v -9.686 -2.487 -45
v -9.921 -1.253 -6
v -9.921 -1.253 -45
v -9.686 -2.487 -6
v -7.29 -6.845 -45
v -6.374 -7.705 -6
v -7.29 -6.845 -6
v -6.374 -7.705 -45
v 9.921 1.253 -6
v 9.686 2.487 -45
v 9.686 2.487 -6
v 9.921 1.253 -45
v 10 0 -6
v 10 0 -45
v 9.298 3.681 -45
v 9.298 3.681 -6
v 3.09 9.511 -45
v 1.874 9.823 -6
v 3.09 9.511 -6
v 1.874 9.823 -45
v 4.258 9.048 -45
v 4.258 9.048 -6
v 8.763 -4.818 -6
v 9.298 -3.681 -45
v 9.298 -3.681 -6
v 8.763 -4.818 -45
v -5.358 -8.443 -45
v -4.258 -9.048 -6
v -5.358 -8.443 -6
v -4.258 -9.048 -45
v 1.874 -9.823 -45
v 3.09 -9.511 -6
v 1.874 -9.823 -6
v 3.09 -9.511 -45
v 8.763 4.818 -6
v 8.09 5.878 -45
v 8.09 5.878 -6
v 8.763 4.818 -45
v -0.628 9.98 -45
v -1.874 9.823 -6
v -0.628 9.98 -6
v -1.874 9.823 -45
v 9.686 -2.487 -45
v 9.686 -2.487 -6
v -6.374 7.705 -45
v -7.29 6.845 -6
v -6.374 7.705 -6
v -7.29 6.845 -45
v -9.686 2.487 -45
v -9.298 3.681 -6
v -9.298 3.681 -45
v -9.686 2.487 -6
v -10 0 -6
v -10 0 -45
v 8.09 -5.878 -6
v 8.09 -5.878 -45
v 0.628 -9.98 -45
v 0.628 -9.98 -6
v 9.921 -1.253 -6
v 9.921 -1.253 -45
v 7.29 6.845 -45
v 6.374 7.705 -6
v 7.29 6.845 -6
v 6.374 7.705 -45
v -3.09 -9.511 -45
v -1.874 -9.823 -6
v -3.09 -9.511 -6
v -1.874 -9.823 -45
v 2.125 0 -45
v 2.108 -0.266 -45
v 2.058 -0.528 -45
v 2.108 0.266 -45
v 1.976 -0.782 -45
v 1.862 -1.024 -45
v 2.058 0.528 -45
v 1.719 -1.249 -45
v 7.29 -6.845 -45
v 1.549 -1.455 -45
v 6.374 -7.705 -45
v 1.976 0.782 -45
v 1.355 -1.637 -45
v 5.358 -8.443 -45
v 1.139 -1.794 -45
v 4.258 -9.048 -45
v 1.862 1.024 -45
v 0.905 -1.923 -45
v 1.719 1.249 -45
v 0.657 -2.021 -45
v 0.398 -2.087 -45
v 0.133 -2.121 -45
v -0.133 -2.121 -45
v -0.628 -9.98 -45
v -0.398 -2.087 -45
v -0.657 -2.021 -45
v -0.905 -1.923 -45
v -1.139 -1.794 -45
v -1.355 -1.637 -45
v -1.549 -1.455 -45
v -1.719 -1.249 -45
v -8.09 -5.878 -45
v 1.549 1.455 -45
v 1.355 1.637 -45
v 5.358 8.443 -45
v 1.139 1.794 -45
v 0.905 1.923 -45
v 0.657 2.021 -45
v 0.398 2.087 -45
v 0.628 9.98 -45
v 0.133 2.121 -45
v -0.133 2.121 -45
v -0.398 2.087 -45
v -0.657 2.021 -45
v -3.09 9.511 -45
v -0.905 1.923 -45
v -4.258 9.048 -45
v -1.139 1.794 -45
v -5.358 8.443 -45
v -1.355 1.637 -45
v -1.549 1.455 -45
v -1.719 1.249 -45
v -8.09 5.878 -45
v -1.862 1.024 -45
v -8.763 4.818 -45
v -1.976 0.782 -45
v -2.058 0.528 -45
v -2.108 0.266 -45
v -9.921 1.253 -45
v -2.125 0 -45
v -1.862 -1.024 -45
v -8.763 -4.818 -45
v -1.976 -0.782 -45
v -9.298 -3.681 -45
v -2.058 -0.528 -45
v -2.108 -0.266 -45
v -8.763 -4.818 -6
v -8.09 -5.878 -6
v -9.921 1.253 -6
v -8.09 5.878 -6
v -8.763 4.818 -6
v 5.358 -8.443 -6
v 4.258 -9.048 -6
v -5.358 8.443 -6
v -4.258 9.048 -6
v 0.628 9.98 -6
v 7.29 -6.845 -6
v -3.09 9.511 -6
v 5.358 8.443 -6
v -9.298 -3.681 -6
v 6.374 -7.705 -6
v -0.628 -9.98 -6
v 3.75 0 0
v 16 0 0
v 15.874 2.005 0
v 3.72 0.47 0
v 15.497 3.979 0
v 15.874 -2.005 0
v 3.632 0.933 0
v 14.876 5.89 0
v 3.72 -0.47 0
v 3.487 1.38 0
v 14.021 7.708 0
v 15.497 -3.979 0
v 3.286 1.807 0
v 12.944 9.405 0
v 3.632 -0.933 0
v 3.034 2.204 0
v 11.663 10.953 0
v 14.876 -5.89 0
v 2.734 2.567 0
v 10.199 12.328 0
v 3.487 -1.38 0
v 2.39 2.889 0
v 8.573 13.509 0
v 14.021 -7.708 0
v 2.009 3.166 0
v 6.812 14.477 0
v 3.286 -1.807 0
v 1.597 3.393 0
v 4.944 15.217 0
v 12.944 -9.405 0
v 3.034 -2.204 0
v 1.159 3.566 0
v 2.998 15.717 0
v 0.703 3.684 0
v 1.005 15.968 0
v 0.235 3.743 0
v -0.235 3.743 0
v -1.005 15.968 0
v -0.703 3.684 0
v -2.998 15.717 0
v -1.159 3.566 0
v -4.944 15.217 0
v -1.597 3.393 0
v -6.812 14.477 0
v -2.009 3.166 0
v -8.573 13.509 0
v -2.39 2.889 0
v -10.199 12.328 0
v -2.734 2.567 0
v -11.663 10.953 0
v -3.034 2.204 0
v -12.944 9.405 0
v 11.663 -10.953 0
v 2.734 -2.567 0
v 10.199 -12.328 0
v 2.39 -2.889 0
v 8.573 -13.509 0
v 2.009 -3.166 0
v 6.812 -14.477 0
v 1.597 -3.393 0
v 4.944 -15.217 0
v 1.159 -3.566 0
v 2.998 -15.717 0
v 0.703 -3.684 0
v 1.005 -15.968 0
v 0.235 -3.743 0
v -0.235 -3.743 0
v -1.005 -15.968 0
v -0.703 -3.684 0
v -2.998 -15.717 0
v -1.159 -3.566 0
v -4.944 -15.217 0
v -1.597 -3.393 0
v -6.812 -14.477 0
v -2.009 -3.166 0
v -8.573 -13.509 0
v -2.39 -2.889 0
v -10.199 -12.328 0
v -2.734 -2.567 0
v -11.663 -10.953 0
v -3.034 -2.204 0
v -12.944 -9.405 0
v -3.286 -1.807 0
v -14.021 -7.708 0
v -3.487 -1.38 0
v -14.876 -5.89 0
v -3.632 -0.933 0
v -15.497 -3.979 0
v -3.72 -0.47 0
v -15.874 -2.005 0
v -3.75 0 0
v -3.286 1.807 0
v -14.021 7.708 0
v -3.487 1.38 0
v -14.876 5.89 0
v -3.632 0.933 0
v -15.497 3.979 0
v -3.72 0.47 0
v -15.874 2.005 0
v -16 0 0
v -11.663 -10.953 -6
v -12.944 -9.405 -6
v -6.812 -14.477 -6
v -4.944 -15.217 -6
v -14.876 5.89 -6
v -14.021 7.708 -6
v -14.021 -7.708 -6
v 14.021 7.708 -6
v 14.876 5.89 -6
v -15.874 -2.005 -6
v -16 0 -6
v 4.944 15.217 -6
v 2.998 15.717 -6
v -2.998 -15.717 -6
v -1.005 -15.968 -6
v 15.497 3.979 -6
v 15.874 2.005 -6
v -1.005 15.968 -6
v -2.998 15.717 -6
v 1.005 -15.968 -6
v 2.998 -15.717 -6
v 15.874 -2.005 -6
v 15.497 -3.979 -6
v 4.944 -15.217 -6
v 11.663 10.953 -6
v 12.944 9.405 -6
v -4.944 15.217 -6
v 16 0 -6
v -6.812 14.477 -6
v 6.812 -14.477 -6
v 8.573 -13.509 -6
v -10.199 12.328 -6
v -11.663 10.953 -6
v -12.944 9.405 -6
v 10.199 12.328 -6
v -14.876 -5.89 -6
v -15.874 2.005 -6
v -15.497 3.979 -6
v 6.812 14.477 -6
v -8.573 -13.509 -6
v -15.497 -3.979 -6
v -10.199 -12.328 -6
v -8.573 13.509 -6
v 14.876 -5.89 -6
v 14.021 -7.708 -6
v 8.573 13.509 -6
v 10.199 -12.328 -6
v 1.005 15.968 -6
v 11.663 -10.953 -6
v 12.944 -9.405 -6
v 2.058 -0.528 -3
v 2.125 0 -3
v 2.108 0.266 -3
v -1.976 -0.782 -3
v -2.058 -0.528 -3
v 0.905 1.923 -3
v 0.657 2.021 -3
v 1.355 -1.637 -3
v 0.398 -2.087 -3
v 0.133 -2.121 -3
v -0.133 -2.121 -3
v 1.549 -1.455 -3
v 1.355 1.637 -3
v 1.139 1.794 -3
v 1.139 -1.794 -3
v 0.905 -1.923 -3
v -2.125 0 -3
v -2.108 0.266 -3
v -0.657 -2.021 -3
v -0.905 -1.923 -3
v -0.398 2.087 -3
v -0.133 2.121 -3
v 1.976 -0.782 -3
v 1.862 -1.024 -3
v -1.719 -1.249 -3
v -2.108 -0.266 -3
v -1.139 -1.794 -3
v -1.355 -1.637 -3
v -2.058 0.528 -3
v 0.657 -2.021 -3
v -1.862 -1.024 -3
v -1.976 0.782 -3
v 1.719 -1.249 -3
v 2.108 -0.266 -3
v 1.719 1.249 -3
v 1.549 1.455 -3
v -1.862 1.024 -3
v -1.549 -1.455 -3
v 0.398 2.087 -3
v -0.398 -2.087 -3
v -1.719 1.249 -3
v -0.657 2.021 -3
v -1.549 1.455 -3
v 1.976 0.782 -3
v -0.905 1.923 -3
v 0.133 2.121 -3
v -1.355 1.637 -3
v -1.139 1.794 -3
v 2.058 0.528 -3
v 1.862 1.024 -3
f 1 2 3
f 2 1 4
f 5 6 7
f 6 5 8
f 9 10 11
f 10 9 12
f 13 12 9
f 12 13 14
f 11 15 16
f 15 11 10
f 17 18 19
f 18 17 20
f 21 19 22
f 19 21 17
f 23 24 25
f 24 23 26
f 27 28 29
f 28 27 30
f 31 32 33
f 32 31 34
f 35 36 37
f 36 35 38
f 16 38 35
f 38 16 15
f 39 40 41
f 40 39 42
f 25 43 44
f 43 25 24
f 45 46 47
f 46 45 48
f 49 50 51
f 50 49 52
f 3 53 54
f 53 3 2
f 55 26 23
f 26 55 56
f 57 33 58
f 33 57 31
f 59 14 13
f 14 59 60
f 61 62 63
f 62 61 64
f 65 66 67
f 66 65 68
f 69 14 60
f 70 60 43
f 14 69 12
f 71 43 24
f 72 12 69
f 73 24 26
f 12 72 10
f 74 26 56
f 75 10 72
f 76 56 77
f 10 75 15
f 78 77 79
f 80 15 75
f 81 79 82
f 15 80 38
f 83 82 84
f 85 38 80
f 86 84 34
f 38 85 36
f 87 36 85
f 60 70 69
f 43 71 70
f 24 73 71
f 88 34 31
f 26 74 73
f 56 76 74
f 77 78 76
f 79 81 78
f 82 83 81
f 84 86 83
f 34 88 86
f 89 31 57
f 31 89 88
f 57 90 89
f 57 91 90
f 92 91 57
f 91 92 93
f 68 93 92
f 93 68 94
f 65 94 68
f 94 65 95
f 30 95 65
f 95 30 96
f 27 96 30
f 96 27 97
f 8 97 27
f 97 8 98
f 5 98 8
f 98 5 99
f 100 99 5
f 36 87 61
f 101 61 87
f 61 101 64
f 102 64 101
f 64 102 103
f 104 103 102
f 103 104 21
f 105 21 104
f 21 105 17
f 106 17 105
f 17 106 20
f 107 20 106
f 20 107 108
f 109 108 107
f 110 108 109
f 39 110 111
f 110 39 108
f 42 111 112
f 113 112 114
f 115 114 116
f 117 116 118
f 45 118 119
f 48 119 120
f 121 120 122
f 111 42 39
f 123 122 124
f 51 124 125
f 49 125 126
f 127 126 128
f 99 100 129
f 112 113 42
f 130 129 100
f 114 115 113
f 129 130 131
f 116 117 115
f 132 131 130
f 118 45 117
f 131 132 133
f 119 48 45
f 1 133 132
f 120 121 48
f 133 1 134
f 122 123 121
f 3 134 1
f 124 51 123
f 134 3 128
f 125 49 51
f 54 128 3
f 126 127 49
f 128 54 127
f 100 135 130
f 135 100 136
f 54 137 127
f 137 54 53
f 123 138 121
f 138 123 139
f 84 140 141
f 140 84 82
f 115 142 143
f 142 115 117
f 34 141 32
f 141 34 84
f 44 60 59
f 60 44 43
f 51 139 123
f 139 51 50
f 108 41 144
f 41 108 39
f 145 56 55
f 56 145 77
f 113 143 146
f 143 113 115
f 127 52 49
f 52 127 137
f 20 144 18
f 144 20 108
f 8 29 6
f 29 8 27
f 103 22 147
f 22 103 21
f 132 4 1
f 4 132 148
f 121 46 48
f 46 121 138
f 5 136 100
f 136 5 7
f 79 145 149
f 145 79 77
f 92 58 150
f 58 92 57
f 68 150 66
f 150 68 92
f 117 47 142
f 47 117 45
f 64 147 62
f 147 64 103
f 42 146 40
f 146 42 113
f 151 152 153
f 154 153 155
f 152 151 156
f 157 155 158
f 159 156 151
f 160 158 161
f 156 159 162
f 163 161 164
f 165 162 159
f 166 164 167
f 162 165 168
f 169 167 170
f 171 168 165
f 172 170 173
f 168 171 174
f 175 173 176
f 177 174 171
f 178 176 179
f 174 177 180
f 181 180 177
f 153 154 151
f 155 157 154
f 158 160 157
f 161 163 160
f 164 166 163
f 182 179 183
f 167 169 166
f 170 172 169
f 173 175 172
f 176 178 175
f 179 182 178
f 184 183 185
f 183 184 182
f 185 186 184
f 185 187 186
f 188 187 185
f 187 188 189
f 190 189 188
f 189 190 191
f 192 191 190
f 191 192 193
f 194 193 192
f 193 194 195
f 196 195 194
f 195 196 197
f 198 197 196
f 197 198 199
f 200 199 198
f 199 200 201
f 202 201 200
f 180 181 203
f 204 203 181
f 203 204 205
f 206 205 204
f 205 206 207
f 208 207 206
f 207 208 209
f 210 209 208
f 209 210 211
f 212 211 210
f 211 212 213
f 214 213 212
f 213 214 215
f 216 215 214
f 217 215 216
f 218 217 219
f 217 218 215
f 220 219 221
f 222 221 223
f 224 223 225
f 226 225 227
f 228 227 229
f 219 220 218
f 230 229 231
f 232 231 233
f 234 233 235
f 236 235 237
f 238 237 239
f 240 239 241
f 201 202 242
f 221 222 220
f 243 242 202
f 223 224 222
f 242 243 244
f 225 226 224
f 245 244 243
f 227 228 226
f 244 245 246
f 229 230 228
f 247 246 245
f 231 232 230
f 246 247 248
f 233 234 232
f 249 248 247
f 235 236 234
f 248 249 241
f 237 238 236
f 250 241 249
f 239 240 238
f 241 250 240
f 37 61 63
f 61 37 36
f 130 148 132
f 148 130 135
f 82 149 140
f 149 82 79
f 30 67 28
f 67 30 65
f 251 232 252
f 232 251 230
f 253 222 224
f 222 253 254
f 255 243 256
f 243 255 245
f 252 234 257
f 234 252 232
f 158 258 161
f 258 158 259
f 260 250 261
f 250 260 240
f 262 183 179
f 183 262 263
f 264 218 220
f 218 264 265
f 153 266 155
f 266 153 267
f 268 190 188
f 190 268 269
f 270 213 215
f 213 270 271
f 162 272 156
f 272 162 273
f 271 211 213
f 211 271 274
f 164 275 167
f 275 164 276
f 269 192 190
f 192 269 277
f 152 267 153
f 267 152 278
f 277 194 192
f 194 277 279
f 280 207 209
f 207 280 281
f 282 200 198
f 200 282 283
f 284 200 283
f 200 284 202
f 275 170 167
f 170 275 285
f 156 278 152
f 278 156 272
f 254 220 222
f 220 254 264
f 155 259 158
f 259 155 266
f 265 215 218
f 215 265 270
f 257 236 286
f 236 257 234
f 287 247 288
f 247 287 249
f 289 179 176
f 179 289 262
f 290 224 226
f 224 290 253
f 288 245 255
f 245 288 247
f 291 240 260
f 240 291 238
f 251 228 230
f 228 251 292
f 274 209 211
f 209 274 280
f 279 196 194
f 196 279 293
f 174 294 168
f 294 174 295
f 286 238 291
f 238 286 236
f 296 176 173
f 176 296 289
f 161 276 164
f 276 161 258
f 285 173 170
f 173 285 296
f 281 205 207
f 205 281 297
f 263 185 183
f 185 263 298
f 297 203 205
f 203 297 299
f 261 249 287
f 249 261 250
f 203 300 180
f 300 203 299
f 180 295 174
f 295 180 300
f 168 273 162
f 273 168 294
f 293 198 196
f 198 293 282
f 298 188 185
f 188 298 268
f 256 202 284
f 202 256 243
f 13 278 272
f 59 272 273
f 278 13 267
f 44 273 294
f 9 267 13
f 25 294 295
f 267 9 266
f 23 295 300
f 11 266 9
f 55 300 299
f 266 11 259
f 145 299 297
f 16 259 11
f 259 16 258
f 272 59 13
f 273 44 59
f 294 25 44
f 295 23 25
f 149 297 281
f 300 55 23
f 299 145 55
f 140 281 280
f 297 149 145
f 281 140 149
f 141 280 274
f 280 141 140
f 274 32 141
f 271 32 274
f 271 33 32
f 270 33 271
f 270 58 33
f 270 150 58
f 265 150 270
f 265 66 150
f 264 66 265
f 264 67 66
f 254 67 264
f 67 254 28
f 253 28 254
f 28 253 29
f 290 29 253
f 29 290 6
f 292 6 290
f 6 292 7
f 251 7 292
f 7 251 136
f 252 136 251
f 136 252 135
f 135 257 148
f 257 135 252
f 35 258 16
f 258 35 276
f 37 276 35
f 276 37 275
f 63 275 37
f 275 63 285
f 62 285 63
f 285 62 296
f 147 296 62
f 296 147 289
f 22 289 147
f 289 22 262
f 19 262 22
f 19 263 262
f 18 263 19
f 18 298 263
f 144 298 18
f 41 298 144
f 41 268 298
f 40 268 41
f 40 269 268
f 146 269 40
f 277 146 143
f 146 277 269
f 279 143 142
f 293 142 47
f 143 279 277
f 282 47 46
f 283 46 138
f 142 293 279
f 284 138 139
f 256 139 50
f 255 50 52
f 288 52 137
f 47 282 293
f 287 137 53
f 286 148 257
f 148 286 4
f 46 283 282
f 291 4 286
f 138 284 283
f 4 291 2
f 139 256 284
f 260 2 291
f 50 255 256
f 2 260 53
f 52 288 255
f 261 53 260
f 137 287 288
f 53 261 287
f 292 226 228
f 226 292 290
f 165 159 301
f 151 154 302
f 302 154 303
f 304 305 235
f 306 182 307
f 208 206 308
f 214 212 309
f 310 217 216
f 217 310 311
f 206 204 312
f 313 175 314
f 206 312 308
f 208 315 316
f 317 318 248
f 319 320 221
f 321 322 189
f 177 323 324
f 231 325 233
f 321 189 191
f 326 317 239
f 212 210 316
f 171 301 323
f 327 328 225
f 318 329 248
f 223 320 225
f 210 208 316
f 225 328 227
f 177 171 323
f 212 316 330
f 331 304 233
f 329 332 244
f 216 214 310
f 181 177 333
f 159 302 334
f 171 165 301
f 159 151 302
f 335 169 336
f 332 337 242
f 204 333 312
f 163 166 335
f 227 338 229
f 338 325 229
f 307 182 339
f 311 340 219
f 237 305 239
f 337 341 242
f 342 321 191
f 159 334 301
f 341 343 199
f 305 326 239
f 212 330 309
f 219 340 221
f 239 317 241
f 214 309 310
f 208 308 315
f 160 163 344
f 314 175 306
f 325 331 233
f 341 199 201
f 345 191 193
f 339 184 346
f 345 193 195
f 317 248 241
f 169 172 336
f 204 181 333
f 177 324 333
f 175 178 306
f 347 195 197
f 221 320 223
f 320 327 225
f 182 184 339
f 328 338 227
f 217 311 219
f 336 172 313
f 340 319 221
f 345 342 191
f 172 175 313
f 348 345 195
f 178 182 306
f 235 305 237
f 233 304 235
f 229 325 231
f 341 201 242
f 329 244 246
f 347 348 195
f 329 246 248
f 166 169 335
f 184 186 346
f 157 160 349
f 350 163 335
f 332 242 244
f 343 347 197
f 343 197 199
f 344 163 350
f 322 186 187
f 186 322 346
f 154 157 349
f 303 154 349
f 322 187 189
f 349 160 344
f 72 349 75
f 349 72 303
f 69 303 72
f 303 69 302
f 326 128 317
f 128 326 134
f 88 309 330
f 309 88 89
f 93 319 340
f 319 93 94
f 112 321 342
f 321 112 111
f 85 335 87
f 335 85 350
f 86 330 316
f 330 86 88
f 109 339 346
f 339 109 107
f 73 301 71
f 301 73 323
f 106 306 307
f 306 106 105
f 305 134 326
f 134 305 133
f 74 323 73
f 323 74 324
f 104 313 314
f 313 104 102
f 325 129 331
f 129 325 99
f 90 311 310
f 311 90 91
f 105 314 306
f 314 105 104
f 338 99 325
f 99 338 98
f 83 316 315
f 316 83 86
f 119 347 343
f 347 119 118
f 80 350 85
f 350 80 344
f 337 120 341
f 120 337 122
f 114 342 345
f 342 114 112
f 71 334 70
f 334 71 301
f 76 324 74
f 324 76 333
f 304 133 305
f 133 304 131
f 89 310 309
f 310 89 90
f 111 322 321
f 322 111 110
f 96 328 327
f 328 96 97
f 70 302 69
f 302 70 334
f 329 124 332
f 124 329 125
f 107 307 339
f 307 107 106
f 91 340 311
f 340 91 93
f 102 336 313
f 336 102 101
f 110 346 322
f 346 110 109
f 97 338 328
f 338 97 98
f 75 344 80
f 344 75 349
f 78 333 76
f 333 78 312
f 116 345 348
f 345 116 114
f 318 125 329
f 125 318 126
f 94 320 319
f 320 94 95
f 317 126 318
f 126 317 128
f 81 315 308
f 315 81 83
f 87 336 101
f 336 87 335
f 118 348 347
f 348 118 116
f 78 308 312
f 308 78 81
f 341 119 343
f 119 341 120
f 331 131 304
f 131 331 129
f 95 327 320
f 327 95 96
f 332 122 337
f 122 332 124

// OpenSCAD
$fn = 50;


difference() {
	union() {
		translate(v = [0, 0, -45.0000000000]) {
			cylinder(h = 45, r = 10.0000000000);
		}
		translate(v = [0, 0, -6.0000000000]) {
			cylinder(h = 6, r = 16.0000000000);
		}
	}
	union() {
		translate(v = [0, 0, 0]) {
			rotate(a = [0, 0, 0]) {
				difference() {
					union() {
						#translate(v = [0, 0, -45.0000000000]) {
							cylinder(h = 45, r = 2.0000000000);
						}
						#translate(v = [0, 0, -3]) {
							cylinder(h = 3, r1 = 2.1250000000, r2 = 3.7500000000);
						}
						#translate(v = [0, 0, -45.0000000000]) {
							cylinder(h = 45, r = 2.1250000000);
						}
						#translate(v = [0, 0, -45.0000000000]) {
							cylinder(h = 45, r = 2.0000000000);
						}
					}
					union();
				}
			}
		}
	}
}
